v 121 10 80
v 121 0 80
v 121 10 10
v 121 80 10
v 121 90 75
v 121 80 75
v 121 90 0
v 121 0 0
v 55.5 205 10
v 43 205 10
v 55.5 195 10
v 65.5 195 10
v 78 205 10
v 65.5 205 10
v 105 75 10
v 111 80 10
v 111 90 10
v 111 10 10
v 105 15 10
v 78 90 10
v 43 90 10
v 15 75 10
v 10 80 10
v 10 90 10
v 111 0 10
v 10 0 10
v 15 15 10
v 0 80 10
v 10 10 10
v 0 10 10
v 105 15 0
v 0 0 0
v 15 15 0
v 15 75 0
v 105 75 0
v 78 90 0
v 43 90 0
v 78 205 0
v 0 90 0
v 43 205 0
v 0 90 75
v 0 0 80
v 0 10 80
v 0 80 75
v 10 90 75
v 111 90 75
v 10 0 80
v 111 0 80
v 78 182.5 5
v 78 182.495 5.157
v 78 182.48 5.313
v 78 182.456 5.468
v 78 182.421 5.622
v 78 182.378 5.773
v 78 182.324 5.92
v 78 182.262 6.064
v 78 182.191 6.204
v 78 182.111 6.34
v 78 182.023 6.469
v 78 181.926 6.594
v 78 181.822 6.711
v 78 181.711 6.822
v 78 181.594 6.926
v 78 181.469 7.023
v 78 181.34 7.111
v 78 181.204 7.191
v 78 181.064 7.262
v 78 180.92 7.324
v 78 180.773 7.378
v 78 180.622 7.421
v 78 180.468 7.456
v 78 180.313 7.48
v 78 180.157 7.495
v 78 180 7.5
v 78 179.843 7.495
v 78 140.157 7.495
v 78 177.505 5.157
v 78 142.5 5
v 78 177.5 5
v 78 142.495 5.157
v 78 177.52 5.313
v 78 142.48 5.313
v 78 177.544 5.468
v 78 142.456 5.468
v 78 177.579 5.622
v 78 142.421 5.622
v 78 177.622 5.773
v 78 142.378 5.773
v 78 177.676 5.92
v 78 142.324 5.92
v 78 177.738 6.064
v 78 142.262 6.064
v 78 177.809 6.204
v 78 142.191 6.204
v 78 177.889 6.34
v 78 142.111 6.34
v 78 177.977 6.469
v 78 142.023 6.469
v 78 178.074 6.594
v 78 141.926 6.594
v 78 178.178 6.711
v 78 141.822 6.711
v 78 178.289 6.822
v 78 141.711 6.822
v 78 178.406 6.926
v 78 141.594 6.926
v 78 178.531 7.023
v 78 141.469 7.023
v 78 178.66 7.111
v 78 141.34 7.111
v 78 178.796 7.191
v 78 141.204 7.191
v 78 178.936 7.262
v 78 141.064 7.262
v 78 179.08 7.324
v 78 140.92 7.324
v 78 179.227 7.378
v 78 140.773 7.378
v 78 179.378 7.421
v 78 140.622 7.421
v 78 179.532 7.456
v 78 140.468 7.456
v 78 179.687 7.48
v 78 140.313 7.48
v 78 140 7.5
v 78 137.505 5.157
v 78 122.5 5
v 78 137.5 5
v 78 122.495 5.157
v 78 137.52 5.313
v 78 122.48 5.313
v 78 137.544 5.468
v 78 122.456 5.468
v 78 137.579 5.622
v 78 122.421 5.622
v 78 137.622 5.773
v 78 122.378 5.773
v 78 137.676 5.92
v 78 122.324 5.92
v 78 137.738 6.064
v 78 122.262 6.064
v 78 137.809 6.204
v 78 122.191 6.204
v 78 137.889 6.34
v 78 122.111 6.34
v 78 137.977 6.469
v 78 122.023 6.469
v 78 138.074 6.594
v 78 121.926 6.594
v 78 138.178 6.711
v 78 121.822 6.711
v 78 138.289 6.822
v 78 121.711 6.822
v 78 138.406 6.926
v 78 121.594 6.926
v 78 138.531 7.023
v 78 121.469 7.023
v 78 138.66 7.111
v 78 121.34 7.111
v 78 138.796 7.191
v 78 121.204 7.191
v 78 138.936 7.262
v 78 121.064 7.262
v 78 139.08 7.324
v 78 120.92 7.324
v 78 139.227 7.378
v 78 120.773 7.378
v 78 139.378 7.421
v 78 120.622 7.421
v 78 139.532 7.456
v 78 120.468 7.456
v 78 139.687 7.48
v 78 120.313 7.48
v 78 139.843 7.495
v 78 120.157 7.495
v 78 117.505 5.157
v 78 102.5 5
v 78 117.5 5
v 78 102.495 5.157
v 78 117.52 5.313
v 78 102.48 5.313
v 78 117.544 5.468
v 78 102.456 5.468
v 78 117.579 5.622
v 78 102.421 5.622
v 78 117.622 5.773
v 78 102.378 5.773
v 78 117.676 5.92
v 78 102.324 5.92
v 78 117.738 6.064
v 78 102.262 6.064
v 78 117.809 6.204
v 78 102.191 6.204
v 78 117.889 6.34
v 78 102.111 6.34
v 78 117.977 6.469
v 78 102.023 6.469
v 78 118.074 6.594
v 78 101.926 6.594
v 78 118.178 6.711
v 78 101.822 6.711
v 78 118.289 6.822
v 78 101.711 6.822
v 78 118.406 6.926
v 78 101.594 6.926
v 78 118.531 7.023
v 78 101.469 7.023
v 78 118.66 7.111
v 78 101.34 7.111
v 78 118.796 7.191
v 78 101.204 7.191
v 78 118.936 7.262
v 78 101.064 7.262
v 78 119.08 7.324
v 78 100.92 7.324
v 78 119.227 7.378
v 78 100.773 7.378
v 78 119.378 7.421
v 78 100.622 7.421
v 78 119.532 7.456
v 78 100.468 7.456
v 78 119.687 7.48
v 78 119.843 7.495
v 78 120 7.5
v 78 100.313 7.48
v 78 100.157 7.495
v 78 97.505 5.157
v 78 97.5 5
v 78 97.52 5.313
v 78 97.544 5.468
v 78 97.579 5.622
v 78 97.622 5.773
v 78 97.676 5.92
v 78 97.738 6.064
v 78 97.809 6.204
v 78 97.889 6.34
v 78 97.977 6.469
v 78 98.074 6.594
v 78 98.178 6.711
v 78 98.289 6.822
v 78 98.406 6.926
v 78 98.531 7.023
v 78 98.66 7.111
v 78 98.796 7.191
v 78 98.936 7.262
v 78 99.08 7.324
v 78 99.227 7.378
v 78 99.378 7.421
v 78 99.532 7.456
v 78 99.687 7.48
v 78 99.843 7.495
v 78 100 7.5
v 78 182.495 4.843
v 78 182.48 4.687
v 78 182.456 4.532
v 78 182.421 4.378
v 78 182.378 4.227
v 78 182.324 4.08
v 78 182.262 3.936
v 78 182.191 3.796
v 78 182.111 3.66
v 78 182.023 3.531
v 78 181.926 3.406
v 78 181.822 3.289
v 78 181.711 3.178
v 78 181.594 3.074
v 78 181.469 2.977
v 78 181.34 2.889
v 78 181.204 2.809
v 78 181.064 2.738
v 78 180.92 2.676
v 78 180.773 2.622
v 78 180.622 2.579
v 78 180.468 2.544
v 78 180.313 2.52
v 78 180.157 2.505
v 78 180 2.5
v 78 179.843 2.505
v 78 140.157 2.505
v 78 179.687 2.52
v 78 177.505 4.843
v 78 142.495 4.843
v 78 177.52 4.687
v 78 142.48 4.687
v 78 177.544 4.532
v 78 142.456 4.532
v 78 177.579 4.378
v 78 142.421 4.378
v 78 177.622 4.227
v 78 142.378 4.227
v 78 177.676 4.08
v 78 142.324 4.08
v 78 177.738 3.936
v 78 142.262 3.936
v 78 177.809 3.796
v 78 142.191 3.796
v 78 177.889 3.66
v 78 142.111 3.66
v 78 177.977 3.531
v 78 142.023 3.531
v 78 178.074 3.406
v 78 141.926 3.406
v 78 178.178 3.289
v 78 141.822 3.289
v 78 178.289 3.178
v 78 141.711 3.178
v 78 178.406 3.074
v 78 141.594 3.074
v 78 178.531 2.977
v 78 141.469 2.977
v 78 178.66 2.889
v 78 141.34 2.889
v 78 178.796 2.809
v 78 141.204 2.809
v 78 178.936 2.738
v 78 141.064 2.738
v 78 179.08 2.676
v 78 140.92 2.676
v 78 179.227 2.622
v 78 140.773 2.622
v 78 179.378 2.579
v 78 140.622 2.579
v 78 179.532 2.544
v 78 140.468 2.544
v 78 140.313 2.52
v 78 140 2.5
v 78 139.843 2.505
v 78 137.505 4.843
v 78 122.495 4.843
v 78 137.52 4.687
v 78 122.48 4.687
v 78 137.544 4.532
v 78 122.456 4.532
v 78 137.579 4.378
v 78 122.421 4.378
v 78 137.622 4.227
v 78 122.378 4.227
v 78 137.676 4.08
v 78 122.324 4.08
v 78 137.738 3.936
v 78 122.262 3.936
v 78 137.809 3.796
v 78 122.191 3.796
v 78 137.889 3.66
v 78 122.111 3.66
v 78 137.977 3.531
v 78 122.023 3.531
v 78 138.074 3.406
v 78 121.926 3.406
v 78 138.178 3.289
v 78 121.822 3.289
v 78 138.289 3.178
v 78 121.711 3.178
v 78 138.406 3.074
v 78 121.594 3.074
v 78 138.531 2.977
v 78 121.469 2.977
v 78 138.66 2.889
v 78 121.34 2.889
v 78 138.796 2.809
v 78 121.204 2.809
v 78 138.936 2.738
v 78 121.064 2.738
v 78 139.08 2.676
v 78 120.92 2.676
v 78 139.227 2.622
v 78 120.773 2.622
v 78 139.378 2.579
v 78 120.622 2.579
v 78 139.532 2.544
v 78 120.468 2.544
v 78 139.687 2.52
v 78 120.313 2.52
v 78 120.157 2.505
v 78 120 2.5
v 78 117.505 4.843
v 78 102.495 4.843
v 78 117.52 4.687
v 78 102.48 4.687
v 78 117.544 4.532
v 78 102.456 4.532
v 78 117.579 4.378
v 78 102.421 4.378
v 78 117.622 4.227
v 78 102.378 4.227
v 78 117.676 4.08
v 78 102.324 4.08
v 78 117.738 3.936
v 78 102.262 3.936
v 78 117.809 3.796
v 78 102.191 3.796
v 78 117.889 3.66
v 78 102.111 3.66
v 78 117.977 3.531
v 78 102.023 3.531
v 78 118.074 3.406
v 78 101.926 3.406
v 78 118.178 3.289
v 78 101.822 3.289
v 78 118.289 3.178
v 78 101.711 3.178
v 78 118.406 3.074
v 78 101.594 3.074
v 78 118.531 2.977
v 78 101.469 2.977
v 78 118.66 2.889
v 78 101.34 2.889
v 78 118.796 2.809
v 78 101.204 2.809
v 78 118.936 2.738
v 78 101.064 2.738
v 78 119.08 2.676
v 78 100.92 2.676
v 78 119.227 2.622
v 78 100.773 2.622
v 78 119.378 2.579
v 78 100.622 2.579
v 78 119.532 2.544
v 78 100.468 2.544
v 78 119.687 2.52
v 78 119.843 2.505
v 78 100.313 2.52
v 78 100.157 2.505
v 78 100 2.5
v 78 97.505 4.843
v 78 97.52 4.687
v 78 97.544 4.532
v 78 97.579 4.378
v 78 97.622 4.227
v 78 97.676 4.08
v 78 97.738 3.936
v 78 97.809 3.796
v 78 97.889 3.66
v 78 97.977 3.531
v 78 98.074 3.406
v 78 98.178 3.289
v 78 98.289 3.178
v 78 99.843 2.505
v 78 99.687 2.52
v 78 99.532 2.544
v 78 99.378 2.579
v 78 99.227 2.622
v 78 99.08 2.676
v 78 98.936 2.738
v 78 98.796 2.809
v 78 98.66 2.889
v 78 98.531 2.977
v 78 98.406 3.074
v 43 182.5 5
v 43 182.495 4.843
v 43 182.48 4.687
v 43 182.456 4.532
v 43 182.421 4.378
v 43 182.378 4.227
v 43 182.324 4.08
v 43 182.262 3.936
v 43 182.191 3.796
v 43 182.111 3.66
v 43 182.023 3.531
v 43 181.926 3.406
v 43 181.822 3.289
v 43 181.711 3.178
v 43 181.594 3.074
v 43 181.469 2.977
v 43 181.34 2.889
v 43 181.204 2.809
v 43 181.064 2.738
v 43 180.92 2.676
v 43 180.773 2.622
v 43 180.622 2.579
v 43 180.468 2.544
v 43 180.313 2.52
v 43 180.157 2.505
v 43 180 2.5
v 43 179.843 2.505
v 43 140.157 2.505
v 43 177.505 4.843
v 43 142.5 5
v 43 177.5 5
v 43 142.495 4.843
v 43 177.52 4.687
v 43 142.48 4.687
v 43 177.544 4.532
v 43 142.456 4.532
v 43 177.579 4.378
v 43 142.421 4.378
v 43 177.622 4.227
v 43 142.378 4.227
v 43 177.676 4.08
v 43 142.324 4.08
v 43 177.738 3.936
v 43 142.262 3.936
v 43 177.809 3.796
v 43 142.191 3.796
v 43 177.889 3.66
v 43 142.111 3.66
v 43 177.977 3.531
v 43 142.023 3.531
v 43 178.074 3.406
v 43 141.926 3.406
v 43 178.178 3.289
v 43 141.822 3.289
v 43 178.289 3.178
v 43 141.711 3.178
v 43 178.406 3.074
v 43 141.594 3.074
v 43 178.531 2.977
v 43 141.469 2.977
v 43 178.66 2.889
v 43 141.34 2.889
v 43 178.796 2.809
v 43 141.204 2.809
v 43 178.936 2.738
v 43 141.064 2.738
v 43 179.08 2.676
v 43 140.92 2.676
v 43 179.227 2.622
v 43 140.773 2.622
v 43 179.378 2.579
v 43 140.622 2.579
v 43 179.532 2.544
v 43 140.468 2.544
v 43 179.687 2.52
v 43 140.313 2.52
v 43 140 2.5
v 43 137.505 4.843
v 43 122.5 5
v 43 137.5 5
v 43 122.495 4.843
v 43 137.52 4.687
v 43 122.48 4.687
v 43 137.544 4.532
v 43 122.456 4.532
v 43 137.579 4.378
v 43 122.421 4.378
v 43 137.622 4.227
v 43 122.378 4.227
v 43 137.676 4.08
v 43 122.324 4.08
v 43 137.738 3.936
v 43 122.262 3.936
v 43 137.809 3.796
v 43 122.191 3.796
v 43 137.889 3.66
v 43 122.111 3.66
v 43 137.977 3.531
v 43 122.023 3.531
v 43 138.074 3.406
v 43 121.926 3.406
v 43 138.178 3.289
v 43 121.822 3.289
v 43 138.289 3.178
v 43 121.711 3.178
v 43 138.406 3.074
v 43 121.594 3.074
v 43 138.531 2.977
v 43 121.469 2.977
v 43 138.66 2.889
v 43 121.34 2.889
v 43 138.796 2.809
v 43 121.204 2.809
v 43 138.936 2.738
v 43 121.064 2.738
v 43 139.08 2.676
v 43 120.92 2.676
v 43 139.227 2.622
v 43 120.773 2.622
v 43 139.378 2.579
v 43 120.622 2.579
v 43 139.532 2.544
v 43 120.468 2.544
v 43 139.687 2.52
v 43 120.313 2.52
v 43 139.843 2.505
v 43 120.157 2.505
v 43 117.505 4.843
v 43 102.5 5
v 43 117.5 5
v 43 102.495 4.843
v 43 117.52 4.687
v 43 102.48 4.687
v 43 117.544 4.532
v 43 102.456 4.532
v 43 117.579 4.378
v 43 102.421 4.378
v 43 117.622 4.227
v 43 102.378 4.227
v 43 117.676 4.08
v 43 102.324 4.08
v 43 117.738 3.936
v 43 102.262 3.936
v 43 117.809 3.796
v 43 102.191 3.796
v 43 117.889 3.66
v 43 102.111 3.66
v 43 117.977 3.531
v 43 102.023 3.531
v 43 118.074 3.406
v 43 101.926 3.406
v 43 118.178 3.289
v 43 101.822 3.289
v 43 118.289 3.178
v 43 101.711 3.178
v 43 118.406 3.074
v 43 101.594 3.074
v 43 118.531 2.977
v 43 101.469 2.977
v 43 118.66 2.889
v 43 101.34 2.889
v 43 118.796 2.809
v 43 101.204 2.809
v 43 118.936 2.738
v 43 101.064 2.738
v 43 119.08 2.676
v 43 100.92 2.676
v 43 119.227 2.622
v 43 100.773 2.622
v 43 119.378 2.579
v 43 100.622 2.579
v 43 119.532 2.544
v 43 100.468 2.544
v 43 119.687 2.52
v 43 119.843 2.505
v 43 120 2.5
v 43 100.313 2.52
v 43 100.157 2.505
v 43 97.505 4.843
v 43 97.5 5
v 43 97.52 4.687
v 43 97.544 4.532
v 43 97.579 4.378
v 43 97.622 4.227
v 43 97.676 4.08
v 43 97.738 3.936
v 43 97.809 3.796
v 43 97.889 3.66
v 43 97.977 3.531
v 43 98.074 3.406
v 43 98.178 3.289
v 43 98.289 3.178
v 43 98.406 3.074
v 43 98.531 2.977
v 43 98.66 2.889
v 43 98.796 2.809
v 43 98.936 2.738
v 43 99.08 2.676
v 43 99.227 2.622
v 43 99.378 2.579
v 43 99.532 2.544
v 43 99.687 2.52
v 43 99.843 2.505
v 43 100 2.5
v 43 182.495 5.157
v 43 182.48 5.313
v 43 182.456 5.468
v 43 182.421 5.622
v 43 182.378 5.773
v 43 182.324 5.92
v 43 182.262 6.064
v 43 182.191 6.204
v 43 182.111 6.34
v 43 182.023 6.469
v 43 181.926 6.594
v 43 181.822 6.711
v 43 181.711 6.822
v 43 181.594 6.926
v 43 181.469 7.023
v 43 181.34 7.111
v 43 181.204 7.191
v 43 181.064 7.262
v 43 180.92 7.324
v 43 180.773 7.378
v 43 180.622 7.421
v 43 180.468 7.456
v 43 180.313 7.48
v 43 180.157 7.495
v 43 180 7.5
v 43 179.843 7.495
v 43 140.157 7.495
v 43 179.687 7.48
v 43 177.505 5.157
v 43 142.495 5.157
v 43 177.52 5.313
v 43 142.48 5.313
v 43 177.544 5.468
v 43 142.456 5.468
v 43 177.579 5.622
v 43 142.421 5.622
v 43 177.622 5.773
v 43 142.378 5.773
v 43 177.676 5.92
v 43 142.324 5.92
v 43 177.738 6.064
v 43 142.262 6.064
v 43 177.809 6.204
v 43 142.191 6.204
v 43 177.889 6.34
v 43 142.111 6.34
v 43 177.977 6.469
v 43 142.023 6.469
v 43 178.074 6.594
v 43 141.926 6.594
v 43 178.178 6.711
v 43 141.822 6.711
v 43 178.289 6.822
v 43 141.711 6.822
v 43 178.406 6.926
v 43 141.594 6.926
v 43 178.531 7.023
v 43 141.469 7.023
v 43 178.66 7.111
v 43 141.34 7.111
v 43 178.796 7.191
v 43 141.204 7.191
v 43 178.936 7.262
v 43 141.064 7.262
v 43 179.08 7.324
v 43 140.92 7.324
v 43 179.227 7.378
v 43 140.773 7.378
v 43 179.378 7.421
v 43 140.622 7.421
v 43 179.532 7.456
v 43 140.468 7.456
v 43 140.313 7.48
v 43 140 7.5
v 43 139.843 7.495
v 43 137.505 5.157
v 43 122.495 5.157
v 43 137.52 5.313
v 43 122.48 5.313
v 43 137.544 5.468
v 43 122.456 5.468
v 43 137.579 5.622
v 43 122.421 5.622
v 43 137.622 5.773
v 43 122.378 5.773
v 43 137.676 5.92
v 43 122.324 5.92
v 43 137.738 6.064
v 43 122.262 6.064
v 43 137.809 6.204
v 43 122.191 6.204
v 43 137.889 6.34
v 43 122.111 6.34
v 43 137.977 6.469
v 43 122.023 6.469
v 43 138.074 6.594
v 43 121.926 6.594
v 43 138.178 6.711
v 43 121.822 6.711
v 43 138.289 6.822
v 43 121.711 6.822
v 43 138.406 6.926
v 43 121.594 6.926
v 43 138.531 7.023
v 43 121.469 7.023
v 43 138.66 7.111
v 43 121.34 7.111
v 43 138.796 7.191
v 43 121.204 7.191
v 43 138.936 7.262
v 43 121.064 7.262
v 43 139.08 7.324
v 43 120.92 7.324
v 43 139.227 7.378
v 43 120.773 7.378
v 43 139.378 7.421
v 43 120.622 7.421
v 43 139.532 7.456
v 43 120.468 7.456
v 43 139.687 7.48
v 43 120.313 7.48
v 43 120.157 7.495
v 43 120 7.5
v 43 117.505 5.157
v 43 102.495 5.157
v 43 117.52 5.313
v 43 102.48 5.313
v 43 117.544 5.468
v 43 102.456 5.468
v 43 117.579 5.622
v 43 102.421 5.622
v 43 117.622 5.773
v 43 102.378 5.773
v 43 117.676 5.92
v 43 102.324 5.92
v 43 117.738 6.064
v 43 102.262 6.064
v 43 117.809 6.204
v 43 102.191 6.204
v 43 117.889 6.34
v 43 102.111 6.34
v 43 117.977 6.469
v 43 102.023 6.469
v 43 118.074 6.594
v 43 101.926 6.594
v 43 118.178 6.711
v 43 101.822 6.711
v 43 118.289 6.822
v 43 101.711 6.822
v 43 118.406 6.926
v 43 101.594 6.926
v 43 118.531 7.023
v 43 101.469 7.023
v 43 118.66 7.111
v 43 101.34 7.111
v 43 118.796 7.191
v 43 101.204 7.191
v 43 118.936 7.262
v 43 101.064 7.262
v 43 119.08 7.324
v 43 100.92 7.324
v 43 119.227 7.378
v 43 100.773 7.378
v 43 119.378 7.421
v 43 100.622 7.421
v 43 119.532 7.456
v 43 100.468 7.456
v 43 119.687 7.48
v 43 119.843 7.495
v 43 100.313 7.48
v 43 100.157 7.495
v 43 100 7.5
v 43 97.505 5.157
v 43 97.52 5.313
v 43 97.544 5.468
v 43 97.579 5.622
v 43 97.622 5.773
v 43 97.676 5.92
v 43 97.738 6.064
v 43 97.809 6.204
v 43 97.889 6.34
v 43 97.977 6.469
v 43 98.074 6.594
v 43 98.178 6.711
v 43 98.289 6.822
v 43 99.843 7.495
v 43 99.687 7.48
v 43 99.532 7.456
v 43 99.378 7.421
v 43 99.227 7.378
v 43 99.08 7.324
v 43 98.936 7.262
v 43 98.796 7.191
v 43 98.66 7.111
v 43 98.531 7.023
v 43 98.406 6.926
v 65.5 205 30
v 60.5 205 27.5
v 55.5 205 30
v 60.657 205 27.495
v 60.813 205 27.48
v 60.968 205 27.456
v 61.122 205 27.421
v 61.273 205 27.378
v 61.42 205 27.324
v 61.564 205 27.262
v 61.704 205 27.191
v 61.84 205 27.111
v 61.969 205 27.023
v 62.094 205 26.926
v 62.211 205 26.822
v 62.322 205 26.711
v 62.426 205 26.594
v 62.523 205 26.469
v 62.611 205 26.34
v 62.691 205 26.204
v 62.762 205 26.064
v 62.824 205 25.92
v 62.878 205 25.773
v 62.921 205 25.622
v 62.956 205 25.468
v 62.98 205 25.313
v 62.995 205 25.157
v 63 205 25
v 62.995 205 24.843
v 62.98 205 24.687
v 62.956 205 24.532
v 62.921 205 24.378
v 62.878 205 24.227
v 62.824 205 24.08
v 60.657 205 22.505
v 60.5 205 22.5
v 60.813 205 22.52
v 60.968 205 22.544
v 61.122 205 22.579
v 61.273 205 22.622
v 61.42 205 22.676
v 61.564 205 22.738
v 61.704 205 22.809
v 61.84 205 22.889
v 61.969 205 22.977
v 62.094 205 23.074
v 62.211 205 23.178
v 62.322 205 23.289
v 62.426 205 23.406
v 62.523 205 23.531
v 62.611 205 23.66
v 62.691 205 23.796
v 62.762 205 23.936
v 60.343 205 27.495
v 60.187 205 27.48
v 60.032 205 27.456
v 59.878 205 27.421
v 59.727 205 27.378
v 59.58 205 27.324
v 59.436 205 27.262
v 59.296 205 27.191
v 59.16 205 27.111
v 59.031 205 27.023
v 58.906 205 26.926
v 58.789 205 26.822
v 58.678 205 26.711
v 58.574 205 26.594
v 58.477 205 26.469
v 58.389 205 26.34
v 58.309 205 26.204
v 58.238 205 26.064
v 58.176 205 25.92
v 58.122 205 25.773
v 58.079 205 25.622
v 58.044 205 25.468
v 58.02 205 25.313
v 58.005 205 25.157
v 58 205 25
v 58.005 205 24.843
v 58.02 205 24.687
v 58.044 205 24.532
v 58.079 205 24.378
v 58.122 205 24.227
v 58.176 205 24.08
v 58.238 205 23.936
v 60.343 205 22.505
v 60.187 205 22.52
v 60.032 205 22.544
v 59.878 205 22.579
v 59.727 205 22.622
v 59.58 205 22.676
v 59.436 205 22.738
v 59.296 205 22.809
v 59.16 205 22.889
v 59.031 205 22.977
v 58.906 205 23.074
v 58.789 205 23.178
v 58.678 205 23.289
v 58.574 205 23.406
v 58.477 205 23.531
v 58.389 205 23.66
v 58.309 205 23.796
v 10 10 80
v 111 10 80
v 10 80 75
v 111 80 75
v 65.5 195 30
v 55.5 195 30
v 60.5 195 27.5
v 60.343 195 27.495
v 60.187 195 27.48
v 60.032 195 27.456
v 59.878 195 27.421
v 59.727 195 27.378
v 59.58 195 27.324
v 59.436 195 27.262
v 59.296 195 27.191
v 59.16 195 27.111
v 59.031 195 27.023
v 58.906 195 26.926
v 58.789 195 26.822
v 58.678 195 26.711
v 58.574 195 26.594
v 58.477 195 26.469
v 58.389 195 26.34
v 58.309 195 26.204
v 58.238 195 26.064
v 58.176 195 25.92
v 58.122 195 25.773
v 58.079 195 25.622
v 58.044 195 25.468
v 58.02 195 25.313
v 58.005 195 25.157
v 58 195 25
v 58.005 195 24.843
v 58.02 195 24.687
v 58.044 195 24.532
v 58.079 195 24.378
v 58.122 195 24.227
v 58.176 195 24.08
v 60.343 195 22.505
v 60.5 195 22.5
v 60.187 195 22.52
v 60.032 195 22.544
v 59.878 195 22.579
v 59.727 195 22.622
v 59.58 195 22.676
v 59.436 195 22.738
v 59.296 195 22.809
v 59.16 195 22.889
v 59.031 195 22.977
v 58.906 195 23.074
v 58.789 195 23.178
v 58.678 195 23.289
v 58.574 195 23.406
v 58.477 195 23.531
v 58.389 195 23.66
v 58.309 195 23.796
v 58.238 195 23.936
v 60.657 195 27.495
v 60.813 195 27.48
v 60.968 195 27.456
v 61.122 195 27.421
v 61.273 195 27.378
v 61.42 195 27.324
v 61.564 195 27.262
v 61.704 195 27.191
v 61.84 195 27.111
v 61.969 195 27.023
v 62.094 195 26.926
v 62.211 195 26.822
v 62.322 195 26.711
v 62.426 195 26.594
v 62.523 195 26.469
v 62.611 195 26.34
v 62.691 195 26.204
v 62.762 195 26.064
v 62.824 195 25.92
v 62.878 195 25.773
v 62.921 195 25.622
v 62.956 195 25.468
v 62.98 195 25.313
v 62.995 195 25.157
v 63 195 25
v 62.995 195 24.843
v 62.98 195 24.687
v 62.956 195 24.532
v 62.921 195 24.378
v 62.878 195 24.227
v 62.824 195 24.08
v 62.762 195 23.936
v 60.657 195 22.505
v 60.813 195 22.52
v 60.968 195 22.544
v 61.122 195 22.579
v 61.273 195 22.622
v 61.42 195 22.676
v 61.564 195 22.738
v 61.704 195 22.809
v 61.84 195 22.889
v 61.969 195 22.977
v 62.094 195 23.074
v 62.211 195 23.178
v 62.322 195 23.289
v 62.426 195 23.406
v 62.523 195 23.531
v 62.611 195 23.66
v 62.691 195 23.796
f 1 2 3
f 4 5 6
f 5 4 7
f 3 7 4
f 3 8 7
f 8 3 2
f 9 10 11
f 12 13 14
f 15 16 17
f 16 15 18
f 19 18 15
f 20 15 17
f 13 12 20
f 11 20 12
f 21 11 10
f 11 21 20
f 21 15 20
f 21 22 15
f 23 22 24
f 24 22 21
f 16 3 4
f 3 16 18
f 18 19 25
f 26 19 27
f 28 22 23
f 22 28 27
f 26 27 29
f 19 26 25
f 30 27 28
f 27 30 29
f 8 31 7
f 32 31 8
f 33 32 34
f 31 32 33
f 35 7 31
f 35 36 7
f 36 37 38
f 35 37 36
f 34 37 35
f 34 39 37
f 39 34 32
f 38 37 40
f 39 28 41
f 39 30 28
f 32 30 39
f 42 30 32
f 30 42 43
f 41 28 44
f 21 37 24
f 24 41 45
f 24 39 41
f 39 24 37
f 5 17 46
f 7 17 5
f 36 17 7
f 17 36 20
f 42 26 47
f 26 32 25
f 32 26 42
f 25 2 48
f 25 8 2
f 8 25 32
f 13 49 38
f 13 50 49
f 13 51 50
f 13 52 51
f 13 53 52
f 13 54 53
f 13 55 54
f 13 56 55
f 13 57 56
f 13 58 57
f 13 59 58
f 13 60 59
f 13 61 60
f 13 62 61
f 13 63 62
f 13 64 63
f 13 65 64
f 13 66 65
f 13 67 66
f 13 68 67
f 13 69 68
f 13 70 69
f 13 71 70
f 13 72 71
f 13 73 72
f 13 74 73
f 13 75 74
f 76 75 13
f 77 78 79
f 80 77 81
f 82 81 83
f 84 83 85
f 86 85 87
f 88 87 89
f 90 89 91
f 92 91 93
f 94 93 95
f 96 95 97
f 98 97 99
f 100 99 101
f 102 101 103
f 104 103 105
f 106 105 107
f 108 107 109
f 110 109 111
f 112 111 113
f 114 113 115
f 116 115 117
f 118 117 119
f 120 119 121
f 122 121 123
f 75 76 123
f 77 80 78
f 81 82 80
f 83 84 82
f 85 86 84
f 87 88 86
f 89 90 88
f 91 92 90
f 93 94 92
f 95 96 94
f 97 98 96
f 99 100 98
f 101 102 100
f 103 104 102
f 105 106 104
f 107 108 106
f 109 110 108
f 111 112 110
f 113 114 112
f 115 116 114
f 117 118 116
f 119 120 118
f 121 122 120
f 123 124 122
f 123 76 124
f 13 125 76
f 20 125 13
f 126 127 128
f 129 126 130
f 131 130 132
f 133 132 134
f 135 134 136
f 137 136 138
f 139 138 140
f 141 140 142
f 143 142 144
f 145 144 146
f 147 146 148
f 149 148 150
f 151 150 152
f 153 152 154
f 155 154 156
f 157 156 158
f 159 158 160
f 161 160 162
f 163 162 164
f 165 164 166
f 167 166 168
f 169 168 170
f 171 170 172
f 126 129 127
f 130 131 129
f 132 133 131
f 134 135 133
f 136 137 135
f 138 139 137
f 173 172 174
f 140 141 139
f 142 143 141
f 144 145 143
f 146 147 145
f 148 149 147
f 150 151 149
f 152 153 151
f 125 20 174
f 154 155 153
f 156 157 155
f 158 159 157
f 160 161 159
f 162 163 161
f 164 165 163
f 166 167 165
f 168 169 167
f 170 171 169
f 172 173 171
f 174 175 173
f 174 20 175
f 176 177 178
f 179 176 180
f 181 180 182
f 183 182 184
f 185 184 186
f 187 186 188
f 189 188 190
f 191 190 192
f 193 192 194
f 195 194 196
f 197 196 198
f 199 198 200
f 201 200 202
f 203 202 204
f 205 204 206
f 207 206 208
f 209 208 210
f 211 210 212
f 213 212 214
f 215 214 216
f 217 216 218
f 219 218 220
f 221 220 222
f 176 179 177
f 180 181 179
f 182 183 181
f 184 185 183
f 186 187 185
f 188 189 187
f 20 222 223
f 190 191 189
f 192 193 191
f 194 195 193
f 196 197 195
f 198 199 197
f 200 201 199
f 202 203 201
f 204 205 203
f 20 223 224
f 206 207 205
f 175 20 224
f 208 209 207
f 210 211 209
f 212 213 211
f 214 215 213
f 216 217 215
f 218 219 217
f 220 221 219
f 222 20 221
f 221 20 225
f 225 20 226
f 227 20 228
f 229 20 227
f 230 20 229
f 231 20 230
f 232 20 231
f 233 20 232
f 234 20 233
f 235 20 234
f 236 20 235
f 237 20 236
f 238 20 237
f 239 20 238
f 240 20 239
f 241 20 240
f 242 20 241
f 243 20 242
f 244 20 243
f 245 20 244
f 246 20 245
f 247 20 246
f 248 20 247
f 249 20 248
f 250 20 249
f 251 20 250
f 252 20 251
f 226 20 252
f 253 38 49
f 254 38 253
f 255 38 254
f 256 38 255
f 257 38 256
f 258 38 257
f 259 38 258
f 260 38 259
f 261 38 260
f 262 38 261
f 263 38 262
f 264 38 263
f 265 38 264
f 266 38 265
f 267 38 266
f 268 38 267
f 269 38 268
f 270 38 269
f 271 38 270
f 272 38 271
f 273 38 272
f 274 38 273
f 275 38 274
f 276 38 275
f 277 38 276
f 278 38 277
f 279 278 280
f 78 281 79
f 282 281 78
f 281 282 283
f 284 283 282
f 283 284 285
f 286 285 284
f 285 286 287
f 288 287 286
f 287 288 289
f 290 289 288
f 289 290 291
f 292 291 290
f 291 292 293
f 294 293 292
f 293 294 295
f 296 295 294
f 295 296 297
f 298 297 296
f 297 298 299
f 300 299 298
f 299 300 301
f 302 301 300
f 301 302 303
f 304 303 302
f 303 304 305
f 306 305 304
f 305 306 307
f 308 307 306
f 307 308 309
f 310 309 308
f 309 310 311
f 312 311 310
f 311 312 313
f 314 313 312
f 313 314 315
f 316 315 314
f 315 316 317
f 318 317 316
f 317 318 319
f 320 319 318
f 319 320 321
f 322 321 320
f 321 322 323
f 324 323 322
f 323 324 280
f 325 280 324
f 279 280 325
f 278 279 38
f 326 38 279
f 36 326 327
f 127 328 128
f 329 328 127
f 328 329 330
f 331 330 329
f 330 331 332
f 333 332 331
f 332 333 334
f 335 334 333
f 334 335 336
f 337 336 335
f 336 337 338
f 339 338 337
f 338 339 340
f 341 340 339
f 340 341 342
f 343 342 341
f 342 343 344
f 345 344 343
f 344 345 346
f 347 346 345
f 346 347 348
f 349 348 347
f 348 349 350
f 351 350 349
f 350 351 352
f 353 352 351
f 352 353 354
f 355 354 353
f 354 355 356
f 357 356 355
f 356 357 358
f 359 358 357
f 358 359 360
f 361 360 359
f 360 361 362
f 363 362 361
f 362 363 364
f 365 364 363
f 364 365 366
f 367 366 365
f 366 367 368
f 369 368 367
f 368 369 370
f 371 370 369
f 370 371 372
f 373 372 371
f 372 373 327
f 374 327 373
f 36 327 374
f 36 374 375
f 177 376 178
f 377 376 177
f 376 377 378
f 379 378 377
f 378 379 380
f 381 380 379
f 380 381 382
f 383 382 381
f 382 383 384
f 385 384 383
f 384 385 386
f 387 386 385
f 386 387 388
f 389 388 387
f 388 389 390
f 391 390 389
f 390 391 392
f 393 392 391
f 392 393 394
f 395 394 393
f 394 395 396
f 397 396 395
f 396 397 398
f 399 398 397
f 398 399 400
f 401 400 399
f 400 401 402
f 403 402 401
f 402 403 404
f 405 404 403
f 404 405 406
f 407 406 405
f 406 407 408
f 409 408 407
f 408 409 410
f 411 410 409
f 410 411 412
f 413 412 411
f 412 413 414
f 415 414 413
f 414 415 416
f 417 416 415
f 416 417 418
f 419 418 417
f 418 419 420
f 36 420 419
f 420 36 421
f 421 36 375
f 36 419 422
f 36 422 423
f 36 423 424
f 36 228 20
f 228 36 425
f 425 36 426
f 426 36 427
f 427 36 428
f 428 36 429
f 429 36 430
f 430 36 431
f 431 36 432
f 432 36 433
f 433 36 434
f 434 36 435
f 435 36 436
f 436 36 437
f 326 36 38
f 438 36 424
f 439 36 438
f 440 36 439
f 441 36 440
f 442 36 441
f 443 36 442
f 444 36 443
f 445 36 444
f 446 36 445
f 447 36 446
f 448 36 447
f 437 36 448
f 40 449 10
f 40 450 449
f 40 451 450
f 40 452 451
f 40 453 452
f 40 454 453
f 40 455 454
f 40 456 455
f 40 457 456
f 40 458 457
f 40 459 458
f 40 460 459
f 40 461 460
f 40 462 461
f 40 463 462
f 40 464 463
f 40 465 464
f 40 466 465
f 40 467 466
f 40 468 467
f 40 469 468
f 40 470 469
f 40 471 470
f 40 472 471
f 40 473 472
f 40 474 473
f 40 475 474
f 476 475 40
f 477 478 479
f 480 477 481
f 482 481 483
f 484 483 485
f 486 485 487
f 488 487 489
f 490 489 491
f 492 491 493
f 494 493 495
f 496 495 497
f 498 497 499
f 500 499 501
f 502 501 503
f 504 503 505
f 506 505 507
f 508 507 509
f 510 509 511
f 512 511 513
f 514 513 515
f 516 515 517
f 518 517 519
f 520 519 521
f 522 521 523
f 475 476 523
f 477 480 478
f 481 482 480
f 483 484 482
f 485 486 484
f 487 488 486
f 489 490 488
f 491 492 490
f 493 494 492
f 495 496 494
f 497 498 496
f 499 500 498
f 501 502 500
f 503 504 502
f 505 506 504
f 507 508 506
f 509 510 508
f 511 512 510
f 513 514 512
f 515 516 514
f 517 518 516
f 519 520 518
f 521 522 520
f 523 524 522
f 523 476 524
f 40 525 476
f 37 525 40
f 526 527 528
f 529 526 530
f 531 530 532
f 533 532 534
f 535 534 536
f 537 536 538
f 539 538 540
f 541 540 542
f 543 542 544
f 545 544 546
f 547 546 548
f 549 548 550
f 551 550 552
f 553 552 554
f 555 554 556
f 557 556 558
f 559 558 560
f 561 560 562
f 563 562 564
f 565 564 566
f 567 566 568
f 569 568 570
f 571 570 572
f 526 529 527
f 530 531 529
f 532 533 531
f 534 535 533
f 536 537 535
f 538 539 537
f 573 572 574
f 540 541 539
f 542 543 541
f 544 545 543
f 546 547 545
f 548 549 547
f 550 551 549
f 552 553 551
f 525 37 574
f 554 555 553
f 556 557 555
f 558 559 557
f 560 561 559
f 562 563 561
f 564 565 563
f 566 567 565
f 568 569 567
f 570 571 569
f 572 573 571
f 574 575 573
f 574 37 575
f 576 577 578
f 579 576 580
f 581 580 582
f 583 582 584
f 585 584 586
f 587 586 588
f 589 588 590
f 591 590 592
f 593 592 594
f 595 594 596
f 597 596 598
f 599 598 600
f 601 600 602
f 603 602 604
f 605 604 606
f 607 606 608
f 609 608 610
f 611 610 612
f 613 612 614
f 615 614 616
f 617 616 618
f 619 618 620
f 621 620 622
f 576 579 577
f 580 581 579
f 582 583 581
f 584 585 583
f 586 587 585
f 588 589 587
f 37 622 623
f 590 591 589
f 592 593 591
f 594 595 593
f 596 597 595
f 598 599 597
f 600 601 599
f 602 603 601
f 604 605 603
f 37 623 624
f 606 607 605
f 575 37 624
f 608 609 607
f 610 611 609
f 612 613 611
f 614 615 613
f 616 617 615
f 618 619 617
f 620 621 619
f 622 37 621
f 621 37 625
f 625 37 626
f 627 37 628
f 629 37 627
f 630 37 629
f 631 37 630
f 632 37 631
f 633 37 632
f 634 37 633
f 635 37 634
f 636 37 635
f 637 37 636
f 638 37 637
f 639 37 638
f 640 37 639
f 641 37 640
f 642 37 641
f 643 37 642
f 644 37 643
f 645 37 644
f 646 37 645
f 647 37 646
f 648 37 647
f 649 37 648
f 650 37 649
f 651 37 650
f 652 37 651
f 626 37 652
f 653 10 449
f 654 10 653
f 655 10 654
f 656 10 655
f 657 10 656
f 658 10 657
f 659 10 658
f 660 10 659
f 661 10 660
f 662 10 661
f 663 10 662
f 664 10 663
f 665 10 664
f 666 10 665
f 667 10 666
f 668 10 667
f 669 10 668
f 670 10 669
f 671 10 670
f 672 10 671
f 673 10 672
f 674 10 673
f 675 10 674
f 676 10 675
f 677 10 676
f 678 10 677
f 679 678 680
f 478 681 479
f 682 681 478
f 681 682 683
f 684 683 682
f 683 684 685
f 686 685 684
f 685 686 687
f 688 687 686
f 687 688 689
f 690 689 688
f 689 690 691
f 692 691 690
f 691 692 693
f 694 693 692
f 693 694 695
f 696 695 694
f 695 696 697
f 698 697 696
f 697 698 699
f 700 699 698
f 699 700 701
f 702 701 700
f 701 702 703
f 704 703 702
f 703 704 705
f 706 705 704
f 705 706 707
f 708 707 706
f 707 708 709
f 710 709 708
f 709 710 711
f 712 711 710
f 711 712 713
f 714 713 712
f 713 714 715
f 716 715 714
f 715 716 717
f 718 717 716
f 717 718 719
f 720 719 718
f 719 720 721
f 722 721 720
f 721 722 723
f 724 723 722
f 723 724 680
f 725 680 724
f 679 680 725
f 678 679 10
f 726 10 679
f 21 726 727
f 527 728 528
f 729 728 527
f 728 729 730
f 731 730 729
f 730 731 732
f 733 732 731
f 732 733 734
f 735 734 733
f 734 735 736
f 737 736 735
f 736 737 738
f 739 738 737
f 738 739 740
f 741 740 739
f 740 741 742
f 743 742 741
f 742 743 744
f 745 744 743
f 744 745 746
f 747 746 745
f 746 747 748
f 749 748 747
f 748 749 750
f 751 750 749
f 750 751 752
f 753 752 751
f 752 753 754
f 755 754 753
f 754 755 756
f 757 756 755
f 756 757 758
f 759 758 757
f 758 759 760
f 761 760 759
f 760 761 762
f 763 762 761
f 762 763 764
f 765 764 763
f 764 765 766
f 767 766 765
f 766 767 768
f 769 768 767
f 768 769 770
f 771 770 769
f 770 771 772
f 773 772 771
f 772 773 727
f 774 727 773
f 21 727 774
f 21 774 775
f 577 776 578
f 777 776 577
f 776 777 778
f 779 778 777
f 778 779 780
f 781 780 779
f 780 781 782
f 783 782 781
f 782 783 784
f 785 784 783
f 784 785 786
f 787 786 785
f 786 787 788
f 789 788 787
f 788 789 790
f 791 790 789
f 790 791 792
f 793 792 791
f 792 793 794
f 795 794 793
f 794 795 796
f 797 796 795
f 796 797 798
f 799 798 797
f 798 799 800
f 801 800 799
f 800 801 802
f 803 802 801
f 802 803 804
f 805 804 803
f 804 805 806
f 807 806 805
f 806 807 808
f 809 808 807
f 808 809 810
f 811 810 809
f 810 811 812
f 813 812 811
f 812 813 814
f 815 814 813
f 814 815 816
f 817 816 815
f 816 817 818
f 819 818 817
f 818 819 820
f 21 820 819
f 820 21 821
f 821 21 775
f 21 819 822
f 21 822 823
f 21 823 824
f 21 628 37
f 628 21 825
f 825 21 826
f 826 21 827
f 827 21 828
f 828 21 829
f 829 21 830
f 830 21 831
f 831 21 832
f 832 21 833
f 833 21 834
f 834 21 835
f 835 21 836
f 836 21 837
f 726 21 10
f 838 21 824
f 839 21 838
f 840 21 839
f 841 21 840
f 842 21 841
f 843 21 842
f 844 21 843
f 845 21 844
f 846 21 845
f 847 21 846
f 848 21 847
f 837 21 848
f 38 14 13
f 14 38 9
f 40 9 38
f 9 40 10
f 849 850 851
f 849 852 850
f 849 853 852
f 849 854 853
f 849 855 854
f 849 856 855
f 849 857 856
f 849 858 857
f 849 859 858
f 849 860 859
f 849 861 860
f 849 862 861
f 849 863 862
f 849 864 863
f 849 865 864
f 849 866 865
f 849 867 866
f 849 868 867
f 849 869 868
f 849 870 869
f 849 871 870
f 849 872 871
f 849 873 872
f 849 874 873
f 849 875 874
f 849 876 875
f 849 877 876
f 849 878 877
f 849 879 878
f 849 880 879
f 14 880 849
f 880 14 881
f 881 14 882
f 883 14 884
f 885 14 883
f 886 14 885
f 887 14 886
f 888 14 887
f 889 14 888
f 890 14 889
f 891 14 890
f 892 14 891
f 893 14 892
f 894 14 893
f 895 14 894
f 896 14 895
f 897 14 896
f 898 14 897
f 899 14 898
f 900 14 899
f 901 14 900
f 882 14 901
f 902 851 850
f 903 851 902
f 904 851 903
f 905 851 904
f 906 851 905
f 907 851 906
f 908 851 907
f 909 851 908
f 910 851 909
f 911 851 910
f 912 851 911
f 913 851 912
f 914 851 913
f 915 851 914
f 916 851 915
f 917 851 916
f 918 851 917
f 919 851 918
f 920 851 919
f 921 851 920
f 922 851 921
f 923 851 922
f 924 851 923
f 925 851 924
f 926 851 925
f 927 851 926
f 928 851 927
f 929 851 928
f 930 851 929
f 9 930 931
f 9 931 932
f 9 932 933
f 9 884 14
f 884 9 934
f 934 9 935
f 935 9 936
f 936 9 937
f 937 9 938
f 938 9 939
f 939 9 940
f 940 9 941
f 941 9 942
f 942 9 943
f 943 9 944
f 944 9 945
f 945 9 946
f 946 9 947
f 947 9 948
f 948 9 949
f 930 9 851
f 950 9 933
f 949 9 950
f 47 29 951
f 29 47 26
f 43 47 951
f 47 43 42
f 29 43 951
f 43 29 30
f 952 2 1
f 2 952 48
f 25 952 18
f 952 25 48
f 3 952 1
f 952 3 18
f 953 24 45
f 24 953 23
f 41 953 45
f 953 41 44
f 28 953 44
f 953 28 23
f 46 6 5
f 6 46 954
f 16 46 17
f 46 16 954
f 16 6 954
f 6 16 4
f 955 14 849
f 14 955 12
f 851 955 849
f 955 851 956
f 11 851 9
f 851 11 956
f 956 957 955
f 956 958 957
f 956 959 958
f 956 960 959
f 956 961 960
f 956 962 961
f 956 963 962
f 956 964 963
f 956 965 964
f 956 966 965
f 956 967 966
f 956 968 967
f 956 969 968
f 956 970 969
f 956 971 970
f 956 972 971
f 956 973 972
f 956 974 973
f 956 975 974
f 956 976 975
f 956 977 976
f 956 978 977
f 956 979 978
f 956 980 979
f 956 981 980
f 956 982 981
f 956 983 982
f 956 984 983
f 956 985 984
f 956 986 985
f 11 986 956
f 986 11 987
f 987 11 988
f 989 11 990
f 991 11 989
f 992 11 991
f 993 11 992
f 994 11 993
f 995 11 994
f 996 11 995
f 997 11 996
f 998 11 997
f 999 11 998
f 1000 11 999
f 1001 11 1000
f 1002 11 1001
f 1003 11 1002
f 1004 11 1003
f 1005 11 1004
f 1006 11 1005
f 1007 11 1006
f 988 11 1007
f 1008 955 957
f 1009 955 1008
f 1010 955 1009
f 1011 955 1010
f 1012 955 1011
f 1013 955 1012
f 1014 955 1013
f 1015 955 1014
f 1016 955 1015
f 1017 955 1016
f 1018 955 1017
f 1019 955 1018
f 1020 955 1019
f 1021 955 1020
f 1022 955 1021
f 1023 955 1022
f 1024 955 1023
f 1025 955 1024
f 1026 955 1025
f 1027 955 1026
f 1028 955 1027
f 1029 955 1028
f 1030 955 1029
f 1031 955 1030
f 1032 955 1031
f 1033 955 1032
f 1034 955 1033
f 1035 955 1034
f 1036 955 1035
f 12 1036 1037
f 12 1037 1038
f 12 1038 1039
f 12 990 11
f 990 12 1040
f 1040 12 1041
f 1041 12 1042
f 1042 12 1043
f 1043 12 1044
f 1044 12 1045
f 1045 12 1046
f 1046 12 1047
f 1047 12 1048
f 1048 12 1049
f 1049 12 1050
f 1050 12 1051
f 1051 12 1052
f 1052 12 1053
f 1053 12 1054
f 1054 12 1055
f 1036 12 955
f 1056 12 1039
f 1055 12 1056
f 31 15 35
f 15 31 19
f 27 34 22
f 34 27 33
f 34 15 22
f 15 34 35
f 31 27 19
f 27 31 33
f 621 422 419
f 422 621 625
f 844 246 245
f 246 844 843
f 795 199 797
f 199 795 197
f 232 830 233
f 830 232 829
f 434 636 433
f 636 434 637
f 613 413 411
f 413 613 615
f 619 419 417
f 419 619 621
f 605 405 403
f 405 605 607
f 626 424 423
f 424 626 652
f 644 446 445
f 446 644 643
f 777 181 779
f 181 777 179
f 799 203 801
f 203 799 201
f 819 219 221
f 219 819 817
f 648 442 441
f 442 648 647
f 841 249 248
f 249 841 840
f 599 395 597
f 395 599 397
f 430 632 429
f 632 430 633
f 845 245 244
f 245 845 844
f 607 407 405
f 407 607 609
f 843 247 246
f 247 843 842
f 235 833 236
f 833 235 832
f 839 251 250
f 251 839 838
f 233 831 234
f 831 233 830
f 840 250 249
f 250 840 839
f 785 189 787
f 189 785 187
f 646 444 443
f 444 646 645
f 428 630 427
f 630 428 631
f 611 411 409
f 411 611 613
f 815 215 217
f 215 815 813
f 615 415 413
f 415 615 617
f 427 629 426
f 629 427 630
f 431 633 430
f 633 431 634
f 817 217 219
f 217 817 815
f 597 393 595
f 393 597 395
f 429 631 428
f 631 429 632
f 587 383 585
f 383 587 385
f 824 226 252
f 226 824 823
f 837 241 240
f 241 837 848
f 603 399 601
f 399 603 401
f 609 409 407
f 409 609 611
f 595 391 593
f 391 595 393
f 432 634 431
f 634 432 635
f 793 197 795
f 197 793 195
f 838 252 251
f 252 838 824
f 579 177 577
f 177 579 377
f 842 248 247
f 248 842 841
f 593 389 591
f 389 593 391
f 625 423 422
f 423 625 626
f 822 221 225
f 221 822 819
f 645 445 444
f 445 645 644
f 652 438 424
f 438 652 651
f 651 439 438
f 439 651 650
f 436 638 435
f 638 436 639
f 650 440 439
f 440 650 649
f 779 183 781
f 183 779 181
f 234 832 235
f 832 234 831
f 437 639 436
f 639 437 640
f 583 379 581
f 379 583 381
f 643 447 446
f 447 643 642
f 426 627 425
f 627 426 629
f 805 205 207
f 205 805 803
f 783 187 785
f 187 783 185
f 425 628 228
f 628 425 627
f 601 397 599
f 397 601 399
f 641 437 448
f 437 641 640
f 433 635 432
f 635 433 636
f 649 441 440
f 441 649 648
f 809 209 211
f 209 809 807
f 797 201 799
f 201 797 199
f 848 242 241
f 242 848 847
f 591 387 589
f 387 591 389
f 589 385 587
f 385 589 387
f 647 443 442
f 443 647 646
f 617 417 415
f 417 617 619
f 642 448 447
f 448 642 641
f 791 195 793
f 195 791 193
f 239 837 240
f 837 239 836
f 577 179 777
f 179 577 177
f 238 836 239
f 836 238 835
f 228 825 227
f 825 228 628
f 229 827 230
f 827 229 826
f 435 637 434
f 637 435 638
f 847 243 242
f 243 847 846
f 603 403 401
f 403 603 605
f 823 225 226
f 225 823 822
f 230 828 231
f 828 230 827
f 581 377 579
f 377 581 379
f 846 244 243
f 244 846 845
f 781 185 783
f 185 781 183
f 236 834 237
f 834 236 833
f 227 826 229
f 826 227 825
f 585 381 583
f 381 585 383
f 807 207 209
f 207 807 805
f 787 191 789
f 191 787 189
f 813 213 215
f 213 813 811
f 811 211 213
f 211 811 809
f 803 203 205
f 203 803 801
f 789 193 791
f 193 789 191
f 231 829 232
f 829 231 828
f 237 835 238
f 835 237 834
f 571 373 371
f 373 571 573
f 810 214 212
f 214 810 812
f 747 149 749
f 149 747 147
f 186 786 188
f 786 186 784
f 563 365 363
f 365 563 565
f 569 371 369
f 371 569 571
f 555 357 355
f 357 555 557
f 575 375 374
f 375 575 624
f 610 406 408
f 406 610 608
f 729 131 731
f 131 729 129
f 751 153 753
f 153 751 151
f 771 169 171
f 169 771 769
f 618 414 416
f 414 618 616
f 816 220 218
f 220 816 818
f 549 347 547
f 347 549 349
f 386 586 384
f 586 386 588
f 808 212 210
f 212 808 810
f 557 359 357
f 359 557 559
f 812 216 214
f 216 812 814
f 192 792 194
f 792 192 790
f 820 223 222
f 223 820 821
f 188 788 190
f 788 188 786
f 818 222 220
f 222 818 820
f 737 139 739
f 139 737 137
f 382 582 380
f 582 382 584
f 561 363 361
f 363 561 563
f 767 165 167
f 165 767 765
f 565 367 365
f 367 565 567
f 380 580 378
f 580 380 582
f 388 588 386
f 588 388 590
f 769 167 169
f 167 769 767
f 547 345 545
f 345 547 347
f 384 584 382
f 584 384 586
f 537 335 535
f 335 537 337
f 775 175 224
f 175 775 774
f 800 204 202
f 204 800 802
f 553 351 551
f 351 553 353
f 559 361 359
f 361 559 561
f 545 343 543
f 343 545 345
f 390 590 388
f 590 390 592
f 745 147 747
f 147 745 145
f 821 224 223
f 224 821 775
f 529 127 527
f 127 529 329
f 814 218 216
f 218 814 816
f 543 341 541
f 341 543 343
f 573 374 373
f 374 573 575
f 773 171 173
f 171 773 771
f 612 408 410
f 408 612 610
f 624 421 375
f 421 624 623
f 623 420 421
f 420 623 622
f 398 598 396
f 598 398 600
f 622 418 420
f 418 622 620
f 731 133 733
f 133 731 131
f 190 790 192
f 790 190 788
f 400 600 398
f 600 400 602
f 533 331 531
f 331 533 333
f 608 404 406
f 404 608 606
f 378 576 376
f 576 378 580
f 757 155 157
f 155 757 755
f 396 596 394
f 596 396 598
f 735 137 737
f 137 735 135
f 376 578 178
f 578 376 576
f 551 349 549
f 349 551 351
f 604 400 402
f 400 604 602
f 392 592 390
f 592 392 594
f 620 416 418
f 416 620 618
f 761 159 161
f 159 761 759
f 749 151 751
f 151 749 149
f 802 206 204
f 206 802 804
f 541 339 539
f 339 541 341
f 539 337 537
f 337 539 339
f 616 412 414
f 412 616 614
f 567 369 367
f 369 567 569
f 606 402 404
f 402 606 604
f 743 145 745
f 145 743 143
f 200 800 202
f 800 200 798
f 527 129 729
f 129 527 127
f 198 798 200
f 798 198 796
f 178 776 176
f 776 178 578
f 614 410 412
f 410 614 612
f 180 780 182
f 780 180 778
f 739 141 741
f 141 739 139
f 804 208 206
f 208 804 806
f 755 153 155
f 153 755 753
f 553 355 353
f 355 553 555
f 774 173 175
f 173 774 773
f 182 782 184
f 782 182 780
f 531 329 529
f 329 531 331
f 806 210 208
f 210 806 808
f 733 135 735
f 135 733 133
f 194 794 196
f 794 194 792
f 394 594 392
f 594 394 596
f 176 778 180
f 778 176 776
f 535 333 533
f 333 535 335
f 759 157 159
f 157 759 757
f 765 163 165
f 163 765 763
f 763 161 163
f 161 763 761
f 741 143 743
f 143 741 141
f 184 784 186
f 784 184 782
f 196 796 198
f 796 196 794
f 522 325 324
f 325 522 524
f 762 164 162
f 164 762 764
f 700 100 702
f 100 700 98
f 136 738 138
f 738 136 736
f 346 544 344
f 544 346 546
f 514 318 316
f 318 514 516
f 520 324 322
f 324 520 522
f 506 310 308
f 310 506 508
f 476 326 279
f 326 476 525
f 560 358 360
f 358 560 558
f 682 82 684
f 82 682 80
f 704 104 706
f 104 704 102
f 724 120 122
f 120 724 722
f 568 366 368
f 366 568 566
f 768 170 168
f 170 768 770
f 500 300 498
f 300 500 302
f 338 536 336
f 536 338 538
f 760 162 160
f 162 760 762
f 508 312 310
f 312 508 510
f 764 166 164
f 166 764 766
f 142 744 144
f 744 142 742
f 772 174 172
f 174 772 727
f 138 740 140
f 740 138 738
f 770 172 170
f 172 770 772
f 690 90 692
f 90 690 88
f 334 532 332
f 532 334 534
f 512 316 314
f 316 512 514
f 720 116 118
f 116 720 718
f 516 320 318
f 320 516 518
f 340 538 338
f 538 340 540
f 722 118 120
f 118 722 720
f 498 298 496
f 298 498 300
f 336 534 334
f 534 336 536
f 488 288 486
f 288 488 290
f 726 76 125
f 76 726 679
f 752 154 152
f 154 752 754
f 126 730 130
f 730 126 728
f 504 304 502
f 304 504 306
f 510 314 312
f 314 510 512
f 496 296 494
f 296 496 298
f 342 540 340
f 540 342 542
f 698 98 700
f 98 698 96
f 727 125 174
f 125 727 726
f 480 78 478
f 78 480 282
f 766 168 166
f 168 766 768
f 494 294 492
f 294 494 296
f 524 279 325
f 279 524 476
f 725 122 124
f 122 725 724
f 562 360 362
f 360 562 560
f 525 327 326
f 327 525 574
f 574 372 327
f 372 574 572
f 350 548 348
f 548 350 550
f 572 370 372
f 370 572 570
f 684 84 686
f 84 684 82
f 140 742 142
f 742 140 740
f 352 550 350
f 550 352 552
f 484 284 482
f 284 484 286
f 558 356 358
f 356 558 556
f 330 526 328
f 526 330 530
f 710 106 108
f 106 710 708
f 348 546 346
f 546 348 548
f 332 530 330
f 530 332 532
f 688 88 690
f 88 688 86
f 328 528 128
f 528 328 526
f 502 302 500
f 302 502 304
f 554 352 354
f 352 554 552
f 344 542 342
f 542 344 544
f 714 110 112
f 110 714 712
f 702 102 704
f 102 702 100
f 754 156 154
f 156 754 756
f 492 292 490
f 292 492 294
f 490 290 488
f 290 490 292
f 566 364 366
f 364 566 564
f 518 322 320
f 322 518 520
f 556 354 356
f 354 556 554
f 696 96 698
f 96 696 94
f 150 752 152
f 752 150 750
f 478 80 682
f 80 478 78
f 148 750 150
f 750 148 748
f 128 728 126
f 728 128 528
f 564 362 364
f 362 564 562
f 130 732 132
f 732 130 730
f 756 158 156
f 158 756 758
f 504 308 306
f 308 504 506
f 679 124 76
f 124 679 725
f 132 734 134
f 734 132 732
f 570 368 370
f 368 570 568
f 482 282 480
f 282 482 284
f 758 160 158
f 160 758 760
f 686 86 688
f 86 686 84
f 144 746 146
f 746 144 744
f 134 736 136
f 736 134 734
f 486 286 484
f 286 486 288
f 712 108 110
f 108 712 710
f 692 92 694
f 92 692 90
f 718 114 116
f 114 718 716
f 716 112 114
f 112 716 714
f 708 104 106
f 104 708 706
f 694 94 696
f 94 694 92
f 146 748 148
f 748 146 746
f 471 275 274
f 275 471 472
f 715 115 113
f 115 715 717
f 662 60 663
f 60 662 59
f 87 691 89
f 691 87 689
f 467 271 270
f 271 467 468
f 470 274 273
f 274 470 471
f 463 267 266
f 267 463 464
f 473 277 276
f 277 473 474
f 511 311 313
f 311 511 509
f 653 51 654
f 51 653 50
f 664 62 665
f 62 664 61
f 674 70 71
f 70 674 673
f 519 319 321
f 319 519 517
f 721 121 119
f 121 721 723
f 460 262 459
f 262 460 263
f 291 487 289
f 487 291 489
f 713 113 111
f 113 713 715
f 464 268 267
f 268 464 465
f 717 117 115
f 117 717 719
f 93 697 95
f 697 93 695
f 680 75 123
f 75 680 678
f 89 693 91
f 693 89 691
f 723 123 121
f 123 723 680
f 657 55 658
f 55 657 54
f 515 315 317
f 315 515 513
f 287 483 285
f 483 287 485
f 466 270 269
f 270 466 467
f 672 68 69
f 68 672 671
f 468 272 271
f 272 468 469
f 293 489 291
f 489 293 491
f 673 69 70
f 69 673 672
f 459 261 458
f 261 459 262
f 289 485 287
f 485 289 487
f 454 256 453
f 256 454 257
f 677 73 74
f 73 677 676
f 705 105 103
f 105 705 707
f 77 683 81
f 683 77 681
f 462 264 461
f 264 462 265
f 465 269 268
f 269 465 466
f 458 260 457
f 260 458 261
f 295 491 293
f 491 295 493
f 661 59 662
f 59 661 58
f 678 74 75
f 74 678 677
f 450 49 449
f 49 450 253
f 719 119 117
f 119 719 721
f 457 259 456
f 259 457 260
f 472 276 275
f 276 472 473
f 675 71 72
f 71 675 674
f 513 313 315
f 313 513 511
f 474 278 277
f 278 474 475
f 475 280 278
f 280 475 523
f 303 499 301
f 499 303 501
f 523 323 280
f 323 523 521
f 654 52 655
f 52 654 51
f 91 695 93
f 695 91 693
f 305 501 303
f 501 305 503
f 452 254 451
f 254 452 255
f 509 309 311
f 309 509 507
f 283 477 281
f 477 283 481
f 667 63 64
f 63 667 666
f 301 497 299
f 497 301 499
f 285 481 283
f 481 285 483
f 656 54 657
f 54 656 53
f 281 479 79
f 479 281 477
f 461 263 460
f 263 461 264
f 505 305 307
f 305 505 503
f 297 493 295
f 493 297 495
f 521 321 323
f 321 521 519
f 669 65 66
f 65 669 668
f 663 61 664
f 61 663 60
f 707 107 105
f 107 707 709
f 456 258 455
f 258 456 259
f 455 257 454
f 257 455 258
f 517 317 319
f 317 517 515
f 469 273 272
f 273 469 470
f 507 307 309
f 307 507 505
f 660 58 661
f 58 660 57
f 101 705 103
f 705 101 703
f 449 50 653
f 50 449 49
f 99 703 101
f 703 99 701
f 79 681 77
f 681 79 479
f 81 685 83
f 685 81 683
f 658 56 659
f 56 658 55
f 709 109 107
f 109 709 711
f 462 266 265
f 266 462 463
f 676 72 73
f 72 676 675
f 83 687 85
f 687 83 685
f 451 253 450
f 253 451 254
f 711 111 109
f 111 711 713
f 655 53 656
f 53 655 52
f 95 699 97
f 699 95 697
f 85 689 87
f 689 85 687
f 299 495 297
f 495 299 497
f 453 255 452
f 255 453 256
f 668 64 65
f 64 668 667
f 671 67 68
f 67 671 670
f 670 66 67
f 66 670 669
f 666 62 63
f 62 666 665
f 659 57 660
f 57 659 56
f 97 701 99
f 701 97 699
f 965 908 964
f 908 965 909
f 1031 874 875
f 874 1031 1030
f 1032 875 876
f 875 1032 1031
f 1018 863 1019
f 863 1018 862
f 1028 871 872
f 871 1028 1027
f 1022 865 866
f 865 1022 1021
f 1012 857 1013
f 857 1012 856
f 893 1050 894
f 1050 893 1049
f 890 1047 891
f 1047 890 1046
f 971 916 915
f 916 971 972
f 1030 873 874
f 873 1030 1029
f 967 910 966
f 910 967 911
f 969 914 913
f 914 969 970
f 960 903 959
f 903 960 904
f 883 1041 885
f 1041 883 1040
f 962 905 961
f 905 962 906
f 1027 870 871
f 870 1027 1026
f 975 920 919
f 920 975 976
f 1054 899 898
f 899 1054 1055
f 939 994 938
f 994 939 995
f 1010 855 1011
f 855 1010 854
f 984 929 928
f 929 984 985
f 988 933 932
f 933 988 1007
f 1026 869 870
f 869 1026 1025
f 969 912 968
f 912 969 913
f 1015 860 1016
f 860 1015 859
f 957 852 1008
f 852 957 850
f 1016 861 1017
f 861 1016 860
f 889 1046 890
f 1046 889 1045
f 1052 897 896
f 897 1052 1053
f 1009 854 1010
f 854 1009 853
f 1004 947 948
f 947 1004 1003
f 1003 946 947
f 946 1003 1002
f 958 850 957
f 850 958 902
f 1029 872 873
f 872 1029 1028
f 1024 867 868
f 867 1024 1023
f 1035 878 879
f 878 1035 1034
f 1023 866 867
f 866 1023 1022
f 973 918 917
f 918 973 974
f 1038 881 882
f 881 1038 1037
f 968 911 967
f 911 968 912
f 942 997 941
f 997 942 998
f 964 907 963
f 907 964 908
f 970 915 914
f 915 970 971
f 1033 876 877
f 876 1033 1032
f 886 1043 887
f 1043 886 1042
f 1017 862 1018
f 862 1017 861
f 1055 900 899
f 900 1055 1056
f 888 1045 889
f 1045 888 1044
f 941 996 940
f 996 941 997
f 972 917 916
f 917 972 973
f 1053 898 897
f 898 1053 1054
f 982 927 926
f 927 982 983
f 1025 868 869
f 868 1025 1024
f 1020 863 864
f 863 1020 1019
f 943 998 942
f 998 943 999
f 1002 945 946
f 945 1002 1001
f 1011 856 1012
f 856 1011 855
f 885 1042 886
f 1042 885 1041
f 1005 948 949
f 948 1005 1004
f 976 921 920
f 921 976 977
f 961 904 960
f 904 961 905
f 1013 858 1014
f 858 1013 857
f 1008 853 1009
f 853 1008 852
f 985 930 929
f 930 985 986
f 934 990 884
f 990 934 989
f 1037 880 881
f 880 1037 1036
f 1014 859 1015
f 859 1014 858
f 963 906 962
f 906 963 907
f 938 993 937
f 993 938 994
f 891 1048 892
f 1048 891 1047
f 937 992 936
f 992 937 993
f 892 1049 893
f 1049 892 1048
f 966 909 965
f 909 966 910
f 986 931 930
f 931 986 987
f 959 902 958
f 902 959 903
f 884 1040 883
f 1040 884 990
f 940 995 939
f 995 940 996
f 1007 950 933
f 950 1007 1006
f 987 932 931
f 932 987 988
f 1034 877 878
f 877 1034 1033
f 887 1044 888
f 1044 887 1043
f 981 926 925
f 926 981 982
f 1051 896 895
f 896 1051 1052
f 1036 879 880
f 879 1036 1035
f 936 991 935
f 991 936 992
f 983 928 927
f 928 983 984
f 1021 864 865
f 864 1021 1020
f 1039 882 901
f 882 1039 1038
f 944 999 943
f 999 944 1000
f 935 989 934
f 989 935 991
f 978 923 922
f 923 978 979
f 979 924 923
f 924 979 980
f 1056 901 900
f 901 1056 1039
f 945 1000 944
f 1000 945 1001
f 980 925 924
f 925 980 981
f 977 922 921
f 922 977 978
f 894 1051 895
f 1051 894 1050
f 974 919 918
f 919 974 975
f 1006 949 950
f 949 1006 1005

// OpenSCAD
difference() {
union() {
//Base cube
cube([121,90,10]);

//Extention cube for step
translate([60.5,140,5] ) {
    cube([35,130,10], center=true);   
}

//Column 1
cube([10, 10,80]);

//Column 2
translate([111,0,0]) {
    cube([10, 10,80]);
}

//Column 3
translate([0,80,0]) {
    cube([10, 10,75]);
}

//Column 4
translate([111,80,0]) {
    cube([10, 10,75]);
}

//End stabilizer cube
translate([60.5,200,20]) {
    cube([10,10,20], center=true);
}

}
//Hole in base
translate([15,15,-5]) {
    cube([90,60,20]);
}
//Hole for column 1 and 2
translate([-50,5,75]) {
    rotate([0,90,0]) {
    %cylinder(200,2.5,2.5, $fn=100);
    }
    
}

//Hole for column 3 and 4
translate([-50,85,70]) {
    rotate([0,90,0]) {
    %cylinder(200,2.5,2.5, $fn=100);
    }
    
}
//Holes in extention
translate([-50,100,5]) {
    rotate([0,90,0]) {
    cylinder(200,2.5,2.5, $fn=100);
    }
    
}

translate([-50,120,5]) {
    rotate([0,90,0]) {
    cylinder(200,2.5,2.5, $fn=100);
    }
    
}

translate([-50,140,5]) {
    rotate([0,90,0]) {
    cylinder(200,2.5,2.5, $fn=100);
    }
    
}

translate([-50,180,5]) {
    rotate([0,90,0]) {
    cylinder(200,2.5,2.5, $fn=100);
    }
    
}

//Hole in the end stabilizer cube
translate([60.5, 220, 25]) {
    rotate([90,0,0]) {
    cylinder(50,2.5,2.5, $fn=100);
    }
}

}
